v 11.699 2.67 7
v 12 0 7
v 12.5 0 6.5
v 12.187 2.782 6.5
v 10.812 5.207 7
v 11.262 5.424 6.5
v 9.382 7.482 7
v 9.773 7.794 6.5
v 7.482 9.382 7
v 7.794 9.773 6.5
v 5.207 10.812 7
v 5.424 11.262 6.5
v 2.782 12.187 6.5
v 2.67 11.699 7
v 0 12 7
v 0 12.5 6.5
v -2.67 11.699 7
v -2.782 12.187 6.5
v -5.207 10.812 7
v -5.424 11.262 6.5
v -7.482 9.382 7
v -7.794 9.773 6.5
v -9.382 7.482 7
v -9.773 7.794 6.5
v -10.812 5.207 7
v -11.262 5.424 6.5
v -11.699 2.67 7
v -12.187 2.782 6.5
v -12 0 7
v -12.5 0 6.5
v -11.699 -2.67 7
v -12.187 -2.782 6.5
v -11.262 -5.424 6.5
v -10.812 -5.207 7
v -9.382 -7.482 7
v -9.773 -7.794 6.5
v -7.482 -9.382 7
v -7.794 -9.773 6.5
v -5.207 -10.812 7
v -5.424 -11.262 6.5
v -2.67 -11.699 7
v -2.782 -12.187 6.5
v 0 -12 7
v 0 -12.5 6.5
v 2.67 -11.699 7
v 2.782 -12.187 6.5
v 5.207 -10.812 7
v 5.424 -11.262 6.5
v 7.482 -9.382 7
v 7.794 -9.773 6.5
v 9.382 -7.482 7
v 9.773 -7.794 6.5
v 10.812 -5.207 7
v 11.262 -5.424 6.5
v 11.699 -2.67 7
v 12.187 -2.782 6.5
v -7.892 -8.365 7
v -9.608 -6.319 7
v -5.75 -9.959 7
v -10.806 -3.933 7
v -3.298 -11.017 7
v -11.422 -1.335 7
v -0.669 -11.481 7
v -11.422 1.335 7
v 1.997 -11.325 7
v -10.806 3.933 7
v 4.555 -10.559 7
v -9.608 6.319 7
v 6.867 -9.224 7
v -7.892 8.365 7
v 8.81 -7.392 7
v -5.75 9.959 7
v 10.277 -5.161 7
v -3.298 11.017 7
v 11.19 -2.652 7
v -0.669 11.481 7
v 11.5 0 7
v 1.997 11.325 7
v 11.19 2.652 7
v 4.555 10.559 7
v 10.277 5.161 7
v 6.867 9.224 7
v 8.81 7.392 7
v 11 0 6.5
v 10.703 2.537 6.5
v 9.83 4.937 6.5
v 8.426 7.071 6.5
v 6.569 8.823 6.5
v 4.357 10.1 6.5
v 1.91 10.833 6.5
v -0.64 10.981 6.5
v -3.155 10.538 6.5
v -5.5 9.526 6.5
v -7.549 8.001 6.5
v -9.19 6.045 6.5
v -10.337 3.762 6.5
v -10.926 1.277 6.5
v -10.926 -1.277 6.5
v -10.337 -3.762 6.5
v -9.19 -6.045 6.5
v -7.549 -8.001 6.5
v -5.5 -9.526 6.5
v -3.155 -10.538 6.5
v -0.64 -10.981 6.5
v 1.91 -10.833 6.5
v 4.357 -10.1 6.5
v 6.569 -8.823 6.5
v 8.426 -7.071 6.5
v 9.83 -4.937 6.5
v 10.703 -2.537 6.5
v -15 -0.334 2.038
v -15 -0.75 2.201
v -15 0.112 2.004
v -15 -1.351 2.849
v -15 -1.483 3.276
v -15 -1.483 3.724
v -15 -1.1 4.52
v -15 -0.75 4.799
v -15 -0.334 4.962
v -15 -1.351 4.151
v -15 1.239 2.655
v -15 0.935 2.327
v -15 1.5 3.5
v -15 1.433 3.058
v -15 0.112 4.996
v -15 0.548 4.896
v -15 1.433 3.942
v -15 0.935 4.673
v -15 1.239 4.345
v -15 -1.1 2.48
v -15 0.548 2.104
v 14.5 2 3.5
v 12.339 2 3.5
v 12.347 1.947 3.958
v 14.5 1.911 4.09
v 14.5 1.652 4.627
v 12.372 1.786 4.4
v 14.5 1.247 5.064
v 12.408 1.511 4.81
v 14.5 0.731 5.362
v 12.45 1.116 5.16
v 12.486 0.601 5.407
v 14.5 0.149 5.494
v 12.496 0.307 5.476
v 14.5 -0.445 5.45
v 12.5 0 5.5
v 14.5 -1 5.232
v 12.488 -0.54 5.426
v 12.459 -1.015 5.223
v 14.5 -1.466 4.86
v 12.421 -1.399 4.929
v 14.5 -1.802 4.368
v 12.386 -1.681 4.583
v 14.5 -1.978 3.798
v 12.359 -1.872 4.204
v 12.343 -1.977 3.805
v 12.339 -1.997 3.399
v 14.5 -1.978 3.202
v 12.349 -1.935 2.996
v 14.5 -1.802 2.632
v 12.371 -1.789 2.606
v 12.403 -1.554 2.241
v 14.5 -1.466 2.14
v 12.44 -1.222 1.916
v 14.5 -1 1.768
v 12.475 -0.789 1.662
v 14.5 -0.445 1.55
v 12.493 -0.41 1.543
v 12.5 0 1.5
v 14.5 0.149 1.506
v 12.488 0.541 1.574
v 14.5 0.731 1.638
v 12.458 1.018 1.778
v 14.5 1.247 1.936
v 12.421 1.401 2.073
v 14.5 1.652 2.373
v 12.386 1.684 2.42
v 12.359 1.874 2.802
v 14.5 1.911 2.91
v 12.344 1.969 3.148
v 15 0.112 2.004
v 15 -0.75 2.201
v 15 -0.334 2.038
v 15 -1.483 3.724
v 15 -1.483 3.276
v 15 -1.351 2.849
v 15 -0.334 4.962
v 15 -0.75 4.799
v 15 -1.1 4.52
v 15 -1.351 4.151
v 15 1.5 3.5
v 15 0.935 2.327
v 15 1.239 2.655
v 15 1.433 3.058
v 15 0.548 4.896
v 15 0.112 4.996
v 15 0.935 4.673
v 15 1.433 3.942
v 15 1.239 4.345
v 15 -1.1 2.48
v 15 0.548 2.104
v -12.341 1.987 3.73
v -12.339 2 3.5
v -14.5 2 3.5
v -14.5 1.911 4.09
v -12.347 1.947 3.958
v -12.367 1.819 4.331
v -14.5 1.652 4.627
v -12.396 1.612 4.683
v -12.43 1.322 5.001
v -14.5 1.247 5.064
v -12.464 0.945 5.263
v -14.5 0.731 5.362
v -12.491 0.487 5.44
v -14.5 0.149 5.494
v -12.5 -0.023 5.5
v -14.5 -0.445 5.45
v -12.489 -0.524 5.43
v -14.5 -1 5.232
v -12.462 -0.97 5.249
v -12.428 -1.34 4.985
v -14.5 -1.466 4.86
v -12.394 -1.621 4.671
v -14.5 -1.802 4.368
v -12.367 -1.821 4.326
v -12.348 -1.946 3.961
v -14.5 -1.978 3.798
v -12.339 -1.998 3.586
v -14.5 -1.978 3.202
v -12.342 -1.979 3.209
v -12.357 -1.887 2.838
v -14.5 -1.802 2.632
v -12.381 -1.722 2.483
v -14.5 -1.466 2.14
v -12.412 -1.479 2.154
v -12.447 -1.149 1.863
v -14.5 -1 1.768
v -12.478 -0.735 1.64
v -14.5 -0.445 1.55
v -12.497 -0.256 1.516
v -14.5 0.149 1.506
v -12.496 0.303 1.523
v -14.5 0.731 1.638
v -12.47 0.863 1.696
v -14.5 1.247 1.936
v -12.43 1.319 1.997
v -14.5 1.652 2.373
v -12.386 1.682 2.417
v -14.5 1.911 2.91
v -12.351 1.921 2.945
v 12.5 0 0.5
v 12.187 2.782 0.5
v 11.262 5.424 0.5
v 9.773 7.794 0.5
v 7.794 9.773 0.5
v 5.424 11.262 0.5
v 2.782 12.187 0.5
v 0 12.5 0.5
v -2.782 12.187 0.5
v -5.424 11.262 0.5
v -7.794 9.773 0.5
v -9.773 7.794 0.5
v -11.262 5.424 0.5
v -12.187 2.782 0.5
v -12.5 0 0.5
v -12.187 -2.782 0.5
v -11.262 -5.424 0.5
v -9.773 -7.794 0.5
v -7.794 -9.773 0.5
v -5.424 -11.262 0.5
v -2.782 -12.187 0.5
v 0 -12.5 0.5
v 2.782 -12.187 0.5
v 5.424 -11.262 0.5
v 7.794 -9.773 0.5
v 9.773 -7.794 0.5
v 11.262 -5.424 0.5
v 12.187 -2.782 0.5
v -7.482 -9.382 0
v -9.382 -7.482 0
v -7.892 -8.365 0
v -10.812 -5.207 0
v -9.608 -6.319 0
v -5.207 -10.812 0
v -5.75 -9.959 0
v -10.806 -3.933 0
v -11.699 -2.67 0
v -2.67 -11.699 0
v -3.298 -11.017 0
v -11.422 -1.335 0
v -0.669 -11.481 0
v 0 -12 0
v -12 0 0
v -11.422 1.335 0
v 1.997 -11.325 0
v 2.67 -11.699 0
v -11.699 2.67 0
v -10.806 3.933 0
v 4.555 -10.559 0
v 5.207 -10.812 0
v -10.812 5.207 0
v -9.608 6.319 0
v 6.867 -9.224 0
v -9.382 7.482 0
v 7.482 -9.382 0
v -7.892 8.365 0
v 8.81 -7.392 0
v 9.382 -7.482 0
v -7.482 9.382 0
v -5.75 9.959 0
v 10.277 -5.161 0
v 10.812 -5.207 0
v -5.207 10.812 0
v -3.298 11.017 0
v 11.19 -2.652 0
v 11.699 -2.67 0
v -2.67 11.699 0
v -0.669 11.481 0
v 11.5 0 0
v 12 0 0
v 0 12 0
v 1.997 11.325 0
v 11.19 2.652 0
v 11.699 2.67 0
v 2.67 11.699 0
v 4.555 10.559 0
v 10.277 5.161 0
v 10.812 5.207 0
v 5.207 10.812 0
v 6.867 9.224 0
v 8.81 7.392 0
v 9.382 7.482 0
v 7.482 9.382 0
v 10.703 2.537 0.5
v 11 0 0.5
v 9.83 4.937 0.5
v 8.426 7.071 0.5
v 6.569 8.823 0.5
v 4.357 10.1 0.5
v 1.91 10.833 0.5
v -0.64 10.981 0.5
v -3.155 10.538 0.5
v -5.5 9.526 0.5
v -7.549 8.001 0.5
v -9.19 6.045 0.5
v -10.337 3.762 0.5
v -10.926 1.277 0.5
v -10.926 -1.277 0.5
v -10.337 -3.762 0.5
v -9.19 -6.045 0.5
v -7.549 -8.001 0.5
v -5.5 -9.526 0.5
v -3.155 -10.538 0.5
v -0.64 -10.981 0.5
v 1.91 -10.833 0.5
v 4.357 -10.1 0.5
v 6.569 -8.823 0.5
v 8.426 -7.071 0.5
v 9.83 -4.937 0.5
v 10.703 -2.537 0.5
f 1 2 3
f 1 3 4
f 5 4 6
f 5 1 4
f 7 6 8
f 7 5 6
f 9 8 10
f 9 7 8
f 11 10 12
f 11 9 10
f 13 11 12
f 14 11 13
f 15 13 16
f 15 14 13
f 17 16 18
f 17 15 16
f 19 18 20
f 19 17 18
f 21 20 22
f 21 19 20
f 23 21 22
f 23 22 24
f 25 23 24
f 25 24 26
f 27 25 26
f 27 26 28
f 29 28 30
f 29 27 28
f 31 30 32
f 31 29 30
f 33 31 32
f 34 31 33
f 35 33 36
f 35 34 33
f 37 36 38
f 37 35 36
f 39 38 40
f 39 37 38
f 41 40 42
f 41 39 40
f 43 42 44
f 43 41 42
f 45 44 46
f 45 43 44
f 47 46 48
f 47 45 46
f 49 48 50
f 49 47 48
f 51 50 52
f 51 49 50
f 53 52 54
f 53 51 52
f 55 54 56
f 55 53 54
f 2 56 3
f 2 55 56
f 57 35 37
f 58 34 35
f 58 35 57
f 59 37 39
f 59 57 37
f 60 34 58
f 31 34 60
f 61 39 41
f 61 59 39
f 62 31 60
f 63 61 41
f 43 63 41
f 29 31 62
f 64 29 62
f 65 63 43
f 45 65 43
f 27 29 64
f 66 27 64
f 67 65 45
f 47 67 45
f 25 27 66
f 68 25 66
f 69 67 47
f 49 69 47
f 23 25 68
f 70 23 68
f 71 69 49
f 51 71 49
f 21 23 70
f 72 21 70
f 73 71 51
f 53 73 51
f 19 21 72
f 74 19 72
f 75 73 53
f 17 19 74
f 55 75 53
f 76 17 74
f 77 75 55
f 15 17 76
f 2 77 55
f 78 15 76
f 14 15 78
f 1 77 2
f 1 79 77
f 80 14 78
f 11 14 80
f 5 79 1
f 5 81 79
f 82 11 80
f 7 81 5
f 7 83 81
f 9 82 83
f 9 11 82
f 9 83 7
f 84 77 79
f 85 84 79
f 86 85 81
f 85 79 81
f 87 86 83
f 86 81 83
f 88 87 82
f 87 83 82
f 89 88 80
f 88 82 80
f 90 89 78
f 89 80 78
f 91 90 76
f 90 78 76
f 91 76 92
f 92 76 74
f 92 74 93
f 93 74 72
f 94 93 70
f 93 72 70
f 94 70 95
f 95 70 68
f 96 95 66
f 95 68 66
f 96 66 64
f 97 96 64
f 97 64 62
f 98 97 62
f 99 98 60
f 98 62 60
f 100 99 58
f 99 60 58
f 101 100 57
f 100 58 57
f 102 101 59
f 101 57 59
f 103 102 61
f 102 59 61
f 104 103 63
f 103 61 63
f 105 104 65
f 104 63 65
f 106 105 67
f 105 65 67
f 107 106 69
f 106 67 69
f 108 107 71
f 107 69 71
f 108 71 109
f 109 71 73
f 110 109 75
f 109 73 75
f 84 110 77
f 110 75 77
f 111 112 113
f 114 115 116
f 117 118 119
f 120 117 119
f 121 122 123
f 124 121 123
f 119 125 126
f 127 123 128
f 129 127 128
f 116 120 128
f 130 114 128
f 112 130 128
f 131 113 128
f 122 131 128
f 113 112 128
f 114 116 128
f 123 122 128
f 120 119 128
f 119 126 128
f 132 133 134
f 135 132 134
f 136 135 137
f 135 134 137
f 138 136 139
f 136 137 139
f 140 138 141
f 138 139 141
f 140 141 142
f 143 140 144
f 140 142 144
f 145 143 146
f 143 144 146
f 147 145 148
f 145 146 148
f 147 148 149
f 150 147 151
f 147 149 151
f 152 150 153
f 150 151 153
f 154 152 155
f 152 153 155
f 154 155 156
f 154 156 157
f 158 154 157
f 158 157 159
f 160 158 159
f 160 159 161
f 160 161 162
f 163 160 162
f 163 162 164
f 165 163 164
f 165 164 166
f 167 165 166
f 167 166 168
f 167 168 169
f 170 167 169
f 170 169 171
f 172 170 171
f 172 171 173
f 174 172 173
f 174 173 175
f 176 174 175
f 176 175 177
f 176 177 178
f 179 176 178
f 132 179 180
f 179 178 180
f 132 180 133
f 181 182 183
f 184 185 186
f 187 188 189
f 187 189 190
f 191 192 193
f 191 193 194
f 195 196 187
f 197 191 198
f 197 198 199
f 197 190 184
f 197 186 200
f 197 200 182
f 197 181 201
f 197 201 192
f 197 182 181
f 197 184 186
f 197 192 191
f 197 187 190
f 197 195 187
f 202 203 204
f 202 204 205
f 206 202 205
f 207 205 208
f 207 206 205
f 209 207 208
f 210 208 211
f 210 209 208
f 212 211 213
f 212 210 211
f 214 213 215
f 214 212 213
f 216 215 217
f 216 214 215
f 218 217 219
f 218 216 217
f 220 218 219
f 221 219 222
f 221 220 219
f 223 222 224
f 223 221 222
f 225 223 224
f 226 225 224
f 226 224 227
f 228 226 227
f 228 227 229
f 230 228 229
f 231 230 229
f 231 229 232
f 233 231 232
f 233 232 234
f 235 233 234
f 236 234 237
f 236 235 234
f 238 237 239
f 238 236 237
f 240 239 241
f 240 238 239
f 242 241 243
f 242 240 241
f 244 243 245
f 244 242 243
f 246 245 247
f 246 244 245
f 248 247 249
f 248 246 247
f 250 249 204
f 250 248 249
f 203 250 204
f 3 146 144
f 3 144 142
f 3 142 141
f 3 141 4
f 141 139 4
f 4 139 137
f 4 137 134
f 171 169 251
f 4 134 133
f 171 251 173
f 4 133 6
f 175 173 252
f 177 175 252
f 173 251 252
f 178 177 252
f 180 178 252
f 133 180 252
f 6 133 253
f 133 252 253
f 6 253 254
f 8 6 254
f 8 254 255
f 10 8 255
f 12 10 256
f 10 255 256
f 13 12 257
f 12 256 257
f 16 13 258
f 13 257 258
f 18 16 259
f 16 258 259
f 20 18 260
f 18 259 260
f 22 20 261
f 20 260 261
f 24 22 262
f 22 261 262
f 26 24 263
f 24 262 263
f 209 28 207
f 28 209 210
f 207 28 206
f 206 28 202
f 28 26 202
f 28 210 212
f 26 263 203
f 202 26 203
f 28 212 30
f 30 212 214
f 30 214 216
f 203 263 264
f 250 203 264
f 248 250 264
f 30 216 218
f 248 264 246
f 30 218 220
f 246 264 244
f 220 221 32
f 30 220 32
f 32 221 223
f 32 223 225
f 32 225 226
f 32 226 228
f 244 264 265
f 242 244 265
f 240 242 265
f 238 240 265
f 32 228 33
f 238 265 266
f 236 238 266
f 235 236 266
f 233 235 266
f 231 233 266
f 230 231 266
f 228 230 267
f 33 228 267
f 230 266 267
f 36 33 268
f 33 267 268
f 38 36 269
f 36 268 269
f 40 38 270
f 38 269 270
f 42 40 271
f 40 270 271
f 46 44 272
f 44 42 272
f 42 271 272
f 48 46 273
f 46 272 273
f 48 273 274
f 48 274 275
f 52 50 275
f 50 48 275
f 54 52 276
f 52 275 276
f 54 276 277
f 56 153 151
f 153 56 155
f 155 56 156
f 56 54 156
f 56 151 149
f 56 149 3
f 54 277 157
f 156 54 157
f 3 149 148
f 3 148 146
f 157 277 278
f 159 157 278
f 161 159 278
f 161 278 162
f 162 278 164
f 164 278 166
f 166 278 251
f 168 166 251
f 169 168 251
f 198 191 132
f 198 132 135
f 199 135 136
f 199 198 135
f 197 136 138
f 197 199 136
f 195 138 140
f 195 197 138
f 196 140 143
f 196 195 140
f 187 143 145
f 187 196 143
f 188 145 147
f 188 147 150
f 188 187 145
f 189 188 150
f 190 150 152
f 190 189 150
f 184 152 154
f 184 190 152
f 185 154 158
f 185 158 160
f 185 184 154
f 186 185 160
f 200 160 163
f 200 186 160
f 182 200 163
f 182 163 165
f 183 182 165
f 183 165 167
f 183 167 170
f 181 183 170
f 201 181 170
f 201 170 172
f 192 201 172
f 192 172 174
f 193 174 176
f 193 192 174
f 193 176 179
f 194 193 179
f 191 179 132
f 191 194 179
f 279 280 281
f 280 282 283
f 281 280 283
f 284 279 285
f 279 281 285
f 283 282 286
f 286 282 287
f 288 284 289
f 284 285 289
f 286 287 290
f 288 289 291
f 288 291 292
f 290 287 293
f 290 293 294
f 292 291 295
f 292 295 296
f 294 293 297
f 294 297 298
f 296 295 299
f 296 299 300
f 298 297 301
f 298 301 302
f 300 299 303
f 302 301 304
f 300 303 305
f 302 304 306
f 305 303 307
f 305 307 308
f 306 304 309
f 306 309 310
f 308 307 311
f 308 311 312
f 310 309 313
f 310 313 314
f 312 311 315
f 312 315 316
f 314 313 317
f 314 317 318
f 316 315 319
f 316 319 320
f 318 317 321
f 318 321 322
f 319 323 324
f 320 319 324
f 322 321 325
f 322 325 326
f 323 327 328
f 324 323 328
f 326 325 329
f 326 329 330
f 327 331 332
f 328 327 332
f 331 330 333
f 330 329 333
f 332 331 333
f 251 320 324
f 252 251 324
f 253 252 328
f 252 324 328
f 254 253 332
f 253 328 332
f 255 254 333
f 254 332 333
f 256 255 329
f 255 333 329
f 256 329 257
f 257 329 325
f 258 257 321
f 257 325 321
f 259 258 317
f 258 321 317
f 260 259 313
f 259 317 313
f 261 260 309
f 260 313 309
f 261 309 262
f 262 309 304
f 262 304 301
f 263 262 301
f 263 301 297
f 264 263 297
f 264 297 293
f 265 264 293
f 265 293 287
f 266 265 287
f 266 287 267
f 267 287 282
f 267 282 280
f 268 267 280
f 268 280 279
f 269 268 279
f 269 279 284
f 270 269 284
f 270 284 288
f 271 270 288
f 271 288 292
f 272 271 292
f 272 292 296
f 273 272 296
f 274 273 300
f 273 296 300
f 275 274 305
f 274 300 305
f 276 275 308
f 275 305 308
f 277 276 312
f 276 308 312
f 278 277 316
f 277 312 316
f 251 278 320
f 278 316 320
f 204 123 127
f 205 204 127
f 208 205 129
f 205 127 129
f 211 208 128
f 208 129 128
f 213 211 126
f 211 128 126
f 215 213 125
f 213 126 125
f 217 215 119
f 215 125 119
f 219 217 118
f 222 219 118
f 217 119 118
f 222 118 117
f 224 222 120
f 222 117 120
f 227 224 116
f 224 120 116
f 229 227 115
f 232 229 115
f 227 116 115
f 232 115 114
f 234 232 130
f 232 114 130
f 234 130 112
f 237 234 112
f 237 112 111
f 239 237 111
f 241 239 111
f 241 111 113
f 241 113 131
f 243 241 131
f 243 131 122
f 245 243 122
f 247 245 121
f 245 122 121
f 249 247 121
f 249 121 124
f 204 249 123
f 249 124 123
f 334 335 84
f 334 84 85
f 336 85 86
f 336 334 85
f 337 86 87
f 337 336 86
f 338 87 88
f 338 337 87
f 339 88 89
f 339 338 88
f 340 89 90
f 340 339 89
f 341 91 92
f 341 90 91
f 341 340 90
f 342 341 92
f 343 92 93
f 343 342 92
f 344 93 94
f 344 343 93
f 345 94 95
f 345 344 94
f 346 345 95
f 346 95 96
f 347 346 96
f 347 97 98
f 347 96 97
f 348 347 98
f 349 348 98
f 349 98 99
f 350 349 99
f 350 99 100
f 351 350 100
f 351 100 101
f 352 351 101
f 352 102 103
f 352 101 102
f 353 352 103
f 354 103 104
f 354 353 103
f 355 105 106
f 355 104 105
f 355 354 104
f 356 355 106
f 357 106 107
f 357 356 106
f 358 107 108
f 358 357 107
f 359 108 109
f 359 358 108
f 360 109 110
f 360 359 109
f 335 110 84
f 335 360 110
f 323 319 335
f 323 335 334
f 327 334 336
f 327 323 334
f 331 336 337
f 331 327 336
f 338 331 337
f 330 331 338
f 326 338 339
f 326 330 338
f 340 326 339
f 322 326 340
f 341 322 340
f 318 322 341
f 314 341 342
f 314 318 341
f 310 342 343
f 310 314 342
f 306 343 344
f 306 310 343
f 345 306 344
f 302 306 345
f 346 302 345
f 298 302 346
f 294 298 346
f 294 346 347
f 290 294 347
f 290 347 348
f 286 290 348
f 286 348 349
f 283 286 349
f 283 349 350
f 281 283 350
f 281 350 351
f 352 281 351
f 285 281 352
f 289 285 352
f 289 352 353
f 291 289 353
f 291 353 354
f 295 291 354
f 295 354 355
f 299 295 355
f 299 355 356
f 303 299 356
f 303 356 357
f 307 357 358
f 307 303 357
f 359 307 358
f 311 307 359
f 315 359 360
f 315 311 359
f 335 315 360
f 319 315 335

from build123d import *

# Parameters (mm, degrees)
F0_R     = 12.5
F0_R_2   = 11
F1_DEPTH = 7
F2_SIZE  = 0.5
F4_R     = 2
F5_DEPTH = 4
F7_SIZE  = 0.5


with BuildPart() as f1:
    # F0 (on Top) → F1 (new body)
    with BuildSketch(Plane.XY):
        Circle(F0_R)
        Circle(F0_R_2, mode=Mode.SUBTRACT)
    extrude(amount=F1_DEPTH)

    # F2
    f2_edges = [f1.edges().sort_by_distance(p)[0] for p in [
        (-11, 0, 7),
        (-12.5, 0, 7),
        (-12.5, 0, 0),
        (-11, 0, 0),
    ]]
    chamfer(f2_edges, length=F2_SIZE)

    # F4 (on offset) → F5 (join)
    with BuildSketch(Plane.YZ.offset(11)):
        with Locations((0, 3.5)):
            Circle(F4_R)
    extrude(amount=F5_DEPTH)

    # F6: F1 across plane


with BuildPart() as f1_1:
    add(f1.part)
    add(f1.part.mirror(Plane.YZ))

    # F7
    f7_edges = [f1_1.edges().sort_by_distance(p)[0] for p in [
        (15, -2, 3.5),
        (-15, -2, 3.5),
    ]]
    chamfer(f7_edges, length=F7_SIZE)


solid = f1_1.part
